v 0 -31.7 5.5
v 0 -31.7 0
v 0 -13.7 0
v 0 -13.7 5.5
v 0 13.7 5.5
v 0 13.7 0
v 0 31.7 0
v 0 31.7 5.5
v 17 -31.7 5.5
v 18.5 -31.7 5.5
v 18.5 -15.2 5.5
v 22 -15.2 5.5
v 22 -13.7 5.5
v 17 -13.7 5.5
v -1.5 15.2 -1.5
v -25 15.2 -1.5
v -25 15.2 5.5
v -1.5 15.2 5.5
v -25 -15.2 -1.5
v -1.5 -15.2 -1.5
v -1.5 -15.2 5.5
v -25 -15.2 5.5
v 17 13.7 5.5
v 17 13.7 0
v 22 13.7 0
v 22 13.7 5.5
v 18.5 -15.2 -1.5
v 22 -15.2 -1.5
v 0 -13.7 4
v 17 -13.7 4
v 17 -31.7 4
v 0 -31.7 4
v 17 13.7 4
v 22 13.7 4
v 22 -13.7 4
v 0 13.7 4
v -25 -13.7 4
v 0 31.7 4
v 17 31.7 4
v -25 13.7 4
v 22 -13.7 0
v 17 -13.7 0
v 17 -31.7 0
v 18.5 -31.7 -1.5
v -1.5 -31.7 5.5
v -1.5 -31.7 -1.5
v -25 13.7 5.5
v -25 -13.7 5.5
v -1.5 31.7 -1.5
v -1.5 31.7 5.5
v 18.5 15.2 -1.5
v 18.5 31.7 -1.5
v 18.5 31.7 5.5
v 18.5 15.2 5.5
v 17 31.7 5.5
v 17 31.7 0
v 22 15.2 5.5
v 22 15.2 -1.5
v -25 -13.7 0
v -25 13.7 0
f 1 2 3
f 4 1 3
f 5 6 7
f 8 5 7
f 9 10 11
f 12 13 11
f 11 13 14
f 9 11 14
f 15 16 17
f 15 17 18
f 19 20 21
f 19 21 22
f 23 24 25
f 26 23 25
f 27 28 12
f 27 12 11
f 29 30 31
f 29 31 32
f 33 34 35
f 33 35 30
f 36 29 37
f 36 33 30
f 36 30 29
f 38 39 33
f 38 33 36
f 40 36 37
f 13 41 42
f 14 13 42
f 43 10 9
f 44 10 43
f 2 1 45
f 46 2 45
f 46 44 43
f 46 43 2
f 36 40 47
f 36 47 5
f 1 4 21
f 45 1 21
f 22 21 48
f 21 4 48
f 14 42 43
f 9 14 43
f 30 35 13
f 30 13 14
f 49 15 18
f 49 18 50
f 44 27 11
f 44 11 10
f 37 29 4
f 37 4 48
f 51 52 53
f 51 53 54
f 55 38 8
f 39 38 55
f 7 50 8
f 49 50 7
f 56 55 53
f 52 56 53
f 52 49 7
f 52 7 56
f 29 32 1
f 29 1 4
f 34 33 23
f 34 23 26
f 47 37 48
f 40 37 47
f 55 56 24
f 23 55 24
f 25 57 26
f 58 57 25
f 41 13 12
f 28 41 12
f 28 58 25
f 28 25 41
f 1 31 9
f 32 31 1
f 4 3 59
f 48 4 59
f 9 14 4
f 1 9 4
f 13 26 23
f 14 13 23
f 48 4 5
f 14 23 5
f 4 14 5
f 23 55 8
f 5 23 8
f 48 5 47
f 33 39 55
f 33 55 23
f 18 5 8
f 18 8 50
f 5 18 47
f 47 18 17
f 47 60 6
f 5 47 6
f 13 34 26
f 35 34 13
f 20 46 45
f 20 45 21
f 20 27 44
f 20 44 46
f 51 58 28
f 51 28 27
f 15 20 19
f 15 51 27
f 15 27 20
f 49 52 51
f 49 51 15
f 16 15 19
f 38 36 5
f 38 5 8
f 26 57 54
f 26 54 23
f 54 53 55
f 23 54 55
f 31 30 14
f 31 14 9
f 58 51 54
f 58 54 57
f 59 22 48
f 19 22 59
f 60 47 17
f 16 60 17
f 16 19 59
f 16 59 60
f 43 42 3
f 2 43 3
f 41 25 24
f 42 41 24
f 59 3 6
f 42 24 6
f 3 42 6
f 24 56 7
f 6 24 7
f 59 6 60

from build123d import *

# Parameters (mm, degrees)
PAD_DEPTH    = 5.5
THICKNESS_T  = 1.5
PAD001_DEPTH = 1.5


with BuildPart() as body:
    # Sketch → Pad (new body)
    with BuildSketch(Plane.XY):
        Polygon((-25, -13.7), (-25, 13.7), (0, 13.7), (0, 31.7), (17, 31.7), (17, 13.7), (22, 13.7), (22, -13.7), (17, -13.7), (17, -31.7), (0, -31.7), (0, -13.7), align=None)
    extrude(amount=PAD_DEPTH)

    # Thickness
    thickness_openings = [body.faces().sort_by_distance(p)[0] for p in [
        (1.721392, 0, 5.5),
        (-25, 0, 2.75),
        (8.5, -31.7, 2.75),
        (22, 0, 2.75),
        (8.5, 31.7, 2.75),
    ]]
    offset(amount=THICKNESS_T, openings=thickness_openings, kind=Kind.INTERSECTION)


with BuildPart() as deckel:
    # Sketch001 → Pad001 (new body)
    with BuildSketch(Plane.XY):
        Polygon((-25, -13.7), (-25, 13.7), (0, 13.7), (0, 31.7), (17, 31.7), (17, 13.7), (22, 13.7), (22, -13.7), (17, -13.7), (17, -31.7), (0, -31.7), (0, -13.7), align=None)
    extrude(amount=PAD001_DEPTH)


with BuildPart() as deckel_1:
    # Body001 placement: moved
    add(deckel.part.moved(Location((0, 0, 4))))


solid = Compound([body.part, deckel_1.part])
